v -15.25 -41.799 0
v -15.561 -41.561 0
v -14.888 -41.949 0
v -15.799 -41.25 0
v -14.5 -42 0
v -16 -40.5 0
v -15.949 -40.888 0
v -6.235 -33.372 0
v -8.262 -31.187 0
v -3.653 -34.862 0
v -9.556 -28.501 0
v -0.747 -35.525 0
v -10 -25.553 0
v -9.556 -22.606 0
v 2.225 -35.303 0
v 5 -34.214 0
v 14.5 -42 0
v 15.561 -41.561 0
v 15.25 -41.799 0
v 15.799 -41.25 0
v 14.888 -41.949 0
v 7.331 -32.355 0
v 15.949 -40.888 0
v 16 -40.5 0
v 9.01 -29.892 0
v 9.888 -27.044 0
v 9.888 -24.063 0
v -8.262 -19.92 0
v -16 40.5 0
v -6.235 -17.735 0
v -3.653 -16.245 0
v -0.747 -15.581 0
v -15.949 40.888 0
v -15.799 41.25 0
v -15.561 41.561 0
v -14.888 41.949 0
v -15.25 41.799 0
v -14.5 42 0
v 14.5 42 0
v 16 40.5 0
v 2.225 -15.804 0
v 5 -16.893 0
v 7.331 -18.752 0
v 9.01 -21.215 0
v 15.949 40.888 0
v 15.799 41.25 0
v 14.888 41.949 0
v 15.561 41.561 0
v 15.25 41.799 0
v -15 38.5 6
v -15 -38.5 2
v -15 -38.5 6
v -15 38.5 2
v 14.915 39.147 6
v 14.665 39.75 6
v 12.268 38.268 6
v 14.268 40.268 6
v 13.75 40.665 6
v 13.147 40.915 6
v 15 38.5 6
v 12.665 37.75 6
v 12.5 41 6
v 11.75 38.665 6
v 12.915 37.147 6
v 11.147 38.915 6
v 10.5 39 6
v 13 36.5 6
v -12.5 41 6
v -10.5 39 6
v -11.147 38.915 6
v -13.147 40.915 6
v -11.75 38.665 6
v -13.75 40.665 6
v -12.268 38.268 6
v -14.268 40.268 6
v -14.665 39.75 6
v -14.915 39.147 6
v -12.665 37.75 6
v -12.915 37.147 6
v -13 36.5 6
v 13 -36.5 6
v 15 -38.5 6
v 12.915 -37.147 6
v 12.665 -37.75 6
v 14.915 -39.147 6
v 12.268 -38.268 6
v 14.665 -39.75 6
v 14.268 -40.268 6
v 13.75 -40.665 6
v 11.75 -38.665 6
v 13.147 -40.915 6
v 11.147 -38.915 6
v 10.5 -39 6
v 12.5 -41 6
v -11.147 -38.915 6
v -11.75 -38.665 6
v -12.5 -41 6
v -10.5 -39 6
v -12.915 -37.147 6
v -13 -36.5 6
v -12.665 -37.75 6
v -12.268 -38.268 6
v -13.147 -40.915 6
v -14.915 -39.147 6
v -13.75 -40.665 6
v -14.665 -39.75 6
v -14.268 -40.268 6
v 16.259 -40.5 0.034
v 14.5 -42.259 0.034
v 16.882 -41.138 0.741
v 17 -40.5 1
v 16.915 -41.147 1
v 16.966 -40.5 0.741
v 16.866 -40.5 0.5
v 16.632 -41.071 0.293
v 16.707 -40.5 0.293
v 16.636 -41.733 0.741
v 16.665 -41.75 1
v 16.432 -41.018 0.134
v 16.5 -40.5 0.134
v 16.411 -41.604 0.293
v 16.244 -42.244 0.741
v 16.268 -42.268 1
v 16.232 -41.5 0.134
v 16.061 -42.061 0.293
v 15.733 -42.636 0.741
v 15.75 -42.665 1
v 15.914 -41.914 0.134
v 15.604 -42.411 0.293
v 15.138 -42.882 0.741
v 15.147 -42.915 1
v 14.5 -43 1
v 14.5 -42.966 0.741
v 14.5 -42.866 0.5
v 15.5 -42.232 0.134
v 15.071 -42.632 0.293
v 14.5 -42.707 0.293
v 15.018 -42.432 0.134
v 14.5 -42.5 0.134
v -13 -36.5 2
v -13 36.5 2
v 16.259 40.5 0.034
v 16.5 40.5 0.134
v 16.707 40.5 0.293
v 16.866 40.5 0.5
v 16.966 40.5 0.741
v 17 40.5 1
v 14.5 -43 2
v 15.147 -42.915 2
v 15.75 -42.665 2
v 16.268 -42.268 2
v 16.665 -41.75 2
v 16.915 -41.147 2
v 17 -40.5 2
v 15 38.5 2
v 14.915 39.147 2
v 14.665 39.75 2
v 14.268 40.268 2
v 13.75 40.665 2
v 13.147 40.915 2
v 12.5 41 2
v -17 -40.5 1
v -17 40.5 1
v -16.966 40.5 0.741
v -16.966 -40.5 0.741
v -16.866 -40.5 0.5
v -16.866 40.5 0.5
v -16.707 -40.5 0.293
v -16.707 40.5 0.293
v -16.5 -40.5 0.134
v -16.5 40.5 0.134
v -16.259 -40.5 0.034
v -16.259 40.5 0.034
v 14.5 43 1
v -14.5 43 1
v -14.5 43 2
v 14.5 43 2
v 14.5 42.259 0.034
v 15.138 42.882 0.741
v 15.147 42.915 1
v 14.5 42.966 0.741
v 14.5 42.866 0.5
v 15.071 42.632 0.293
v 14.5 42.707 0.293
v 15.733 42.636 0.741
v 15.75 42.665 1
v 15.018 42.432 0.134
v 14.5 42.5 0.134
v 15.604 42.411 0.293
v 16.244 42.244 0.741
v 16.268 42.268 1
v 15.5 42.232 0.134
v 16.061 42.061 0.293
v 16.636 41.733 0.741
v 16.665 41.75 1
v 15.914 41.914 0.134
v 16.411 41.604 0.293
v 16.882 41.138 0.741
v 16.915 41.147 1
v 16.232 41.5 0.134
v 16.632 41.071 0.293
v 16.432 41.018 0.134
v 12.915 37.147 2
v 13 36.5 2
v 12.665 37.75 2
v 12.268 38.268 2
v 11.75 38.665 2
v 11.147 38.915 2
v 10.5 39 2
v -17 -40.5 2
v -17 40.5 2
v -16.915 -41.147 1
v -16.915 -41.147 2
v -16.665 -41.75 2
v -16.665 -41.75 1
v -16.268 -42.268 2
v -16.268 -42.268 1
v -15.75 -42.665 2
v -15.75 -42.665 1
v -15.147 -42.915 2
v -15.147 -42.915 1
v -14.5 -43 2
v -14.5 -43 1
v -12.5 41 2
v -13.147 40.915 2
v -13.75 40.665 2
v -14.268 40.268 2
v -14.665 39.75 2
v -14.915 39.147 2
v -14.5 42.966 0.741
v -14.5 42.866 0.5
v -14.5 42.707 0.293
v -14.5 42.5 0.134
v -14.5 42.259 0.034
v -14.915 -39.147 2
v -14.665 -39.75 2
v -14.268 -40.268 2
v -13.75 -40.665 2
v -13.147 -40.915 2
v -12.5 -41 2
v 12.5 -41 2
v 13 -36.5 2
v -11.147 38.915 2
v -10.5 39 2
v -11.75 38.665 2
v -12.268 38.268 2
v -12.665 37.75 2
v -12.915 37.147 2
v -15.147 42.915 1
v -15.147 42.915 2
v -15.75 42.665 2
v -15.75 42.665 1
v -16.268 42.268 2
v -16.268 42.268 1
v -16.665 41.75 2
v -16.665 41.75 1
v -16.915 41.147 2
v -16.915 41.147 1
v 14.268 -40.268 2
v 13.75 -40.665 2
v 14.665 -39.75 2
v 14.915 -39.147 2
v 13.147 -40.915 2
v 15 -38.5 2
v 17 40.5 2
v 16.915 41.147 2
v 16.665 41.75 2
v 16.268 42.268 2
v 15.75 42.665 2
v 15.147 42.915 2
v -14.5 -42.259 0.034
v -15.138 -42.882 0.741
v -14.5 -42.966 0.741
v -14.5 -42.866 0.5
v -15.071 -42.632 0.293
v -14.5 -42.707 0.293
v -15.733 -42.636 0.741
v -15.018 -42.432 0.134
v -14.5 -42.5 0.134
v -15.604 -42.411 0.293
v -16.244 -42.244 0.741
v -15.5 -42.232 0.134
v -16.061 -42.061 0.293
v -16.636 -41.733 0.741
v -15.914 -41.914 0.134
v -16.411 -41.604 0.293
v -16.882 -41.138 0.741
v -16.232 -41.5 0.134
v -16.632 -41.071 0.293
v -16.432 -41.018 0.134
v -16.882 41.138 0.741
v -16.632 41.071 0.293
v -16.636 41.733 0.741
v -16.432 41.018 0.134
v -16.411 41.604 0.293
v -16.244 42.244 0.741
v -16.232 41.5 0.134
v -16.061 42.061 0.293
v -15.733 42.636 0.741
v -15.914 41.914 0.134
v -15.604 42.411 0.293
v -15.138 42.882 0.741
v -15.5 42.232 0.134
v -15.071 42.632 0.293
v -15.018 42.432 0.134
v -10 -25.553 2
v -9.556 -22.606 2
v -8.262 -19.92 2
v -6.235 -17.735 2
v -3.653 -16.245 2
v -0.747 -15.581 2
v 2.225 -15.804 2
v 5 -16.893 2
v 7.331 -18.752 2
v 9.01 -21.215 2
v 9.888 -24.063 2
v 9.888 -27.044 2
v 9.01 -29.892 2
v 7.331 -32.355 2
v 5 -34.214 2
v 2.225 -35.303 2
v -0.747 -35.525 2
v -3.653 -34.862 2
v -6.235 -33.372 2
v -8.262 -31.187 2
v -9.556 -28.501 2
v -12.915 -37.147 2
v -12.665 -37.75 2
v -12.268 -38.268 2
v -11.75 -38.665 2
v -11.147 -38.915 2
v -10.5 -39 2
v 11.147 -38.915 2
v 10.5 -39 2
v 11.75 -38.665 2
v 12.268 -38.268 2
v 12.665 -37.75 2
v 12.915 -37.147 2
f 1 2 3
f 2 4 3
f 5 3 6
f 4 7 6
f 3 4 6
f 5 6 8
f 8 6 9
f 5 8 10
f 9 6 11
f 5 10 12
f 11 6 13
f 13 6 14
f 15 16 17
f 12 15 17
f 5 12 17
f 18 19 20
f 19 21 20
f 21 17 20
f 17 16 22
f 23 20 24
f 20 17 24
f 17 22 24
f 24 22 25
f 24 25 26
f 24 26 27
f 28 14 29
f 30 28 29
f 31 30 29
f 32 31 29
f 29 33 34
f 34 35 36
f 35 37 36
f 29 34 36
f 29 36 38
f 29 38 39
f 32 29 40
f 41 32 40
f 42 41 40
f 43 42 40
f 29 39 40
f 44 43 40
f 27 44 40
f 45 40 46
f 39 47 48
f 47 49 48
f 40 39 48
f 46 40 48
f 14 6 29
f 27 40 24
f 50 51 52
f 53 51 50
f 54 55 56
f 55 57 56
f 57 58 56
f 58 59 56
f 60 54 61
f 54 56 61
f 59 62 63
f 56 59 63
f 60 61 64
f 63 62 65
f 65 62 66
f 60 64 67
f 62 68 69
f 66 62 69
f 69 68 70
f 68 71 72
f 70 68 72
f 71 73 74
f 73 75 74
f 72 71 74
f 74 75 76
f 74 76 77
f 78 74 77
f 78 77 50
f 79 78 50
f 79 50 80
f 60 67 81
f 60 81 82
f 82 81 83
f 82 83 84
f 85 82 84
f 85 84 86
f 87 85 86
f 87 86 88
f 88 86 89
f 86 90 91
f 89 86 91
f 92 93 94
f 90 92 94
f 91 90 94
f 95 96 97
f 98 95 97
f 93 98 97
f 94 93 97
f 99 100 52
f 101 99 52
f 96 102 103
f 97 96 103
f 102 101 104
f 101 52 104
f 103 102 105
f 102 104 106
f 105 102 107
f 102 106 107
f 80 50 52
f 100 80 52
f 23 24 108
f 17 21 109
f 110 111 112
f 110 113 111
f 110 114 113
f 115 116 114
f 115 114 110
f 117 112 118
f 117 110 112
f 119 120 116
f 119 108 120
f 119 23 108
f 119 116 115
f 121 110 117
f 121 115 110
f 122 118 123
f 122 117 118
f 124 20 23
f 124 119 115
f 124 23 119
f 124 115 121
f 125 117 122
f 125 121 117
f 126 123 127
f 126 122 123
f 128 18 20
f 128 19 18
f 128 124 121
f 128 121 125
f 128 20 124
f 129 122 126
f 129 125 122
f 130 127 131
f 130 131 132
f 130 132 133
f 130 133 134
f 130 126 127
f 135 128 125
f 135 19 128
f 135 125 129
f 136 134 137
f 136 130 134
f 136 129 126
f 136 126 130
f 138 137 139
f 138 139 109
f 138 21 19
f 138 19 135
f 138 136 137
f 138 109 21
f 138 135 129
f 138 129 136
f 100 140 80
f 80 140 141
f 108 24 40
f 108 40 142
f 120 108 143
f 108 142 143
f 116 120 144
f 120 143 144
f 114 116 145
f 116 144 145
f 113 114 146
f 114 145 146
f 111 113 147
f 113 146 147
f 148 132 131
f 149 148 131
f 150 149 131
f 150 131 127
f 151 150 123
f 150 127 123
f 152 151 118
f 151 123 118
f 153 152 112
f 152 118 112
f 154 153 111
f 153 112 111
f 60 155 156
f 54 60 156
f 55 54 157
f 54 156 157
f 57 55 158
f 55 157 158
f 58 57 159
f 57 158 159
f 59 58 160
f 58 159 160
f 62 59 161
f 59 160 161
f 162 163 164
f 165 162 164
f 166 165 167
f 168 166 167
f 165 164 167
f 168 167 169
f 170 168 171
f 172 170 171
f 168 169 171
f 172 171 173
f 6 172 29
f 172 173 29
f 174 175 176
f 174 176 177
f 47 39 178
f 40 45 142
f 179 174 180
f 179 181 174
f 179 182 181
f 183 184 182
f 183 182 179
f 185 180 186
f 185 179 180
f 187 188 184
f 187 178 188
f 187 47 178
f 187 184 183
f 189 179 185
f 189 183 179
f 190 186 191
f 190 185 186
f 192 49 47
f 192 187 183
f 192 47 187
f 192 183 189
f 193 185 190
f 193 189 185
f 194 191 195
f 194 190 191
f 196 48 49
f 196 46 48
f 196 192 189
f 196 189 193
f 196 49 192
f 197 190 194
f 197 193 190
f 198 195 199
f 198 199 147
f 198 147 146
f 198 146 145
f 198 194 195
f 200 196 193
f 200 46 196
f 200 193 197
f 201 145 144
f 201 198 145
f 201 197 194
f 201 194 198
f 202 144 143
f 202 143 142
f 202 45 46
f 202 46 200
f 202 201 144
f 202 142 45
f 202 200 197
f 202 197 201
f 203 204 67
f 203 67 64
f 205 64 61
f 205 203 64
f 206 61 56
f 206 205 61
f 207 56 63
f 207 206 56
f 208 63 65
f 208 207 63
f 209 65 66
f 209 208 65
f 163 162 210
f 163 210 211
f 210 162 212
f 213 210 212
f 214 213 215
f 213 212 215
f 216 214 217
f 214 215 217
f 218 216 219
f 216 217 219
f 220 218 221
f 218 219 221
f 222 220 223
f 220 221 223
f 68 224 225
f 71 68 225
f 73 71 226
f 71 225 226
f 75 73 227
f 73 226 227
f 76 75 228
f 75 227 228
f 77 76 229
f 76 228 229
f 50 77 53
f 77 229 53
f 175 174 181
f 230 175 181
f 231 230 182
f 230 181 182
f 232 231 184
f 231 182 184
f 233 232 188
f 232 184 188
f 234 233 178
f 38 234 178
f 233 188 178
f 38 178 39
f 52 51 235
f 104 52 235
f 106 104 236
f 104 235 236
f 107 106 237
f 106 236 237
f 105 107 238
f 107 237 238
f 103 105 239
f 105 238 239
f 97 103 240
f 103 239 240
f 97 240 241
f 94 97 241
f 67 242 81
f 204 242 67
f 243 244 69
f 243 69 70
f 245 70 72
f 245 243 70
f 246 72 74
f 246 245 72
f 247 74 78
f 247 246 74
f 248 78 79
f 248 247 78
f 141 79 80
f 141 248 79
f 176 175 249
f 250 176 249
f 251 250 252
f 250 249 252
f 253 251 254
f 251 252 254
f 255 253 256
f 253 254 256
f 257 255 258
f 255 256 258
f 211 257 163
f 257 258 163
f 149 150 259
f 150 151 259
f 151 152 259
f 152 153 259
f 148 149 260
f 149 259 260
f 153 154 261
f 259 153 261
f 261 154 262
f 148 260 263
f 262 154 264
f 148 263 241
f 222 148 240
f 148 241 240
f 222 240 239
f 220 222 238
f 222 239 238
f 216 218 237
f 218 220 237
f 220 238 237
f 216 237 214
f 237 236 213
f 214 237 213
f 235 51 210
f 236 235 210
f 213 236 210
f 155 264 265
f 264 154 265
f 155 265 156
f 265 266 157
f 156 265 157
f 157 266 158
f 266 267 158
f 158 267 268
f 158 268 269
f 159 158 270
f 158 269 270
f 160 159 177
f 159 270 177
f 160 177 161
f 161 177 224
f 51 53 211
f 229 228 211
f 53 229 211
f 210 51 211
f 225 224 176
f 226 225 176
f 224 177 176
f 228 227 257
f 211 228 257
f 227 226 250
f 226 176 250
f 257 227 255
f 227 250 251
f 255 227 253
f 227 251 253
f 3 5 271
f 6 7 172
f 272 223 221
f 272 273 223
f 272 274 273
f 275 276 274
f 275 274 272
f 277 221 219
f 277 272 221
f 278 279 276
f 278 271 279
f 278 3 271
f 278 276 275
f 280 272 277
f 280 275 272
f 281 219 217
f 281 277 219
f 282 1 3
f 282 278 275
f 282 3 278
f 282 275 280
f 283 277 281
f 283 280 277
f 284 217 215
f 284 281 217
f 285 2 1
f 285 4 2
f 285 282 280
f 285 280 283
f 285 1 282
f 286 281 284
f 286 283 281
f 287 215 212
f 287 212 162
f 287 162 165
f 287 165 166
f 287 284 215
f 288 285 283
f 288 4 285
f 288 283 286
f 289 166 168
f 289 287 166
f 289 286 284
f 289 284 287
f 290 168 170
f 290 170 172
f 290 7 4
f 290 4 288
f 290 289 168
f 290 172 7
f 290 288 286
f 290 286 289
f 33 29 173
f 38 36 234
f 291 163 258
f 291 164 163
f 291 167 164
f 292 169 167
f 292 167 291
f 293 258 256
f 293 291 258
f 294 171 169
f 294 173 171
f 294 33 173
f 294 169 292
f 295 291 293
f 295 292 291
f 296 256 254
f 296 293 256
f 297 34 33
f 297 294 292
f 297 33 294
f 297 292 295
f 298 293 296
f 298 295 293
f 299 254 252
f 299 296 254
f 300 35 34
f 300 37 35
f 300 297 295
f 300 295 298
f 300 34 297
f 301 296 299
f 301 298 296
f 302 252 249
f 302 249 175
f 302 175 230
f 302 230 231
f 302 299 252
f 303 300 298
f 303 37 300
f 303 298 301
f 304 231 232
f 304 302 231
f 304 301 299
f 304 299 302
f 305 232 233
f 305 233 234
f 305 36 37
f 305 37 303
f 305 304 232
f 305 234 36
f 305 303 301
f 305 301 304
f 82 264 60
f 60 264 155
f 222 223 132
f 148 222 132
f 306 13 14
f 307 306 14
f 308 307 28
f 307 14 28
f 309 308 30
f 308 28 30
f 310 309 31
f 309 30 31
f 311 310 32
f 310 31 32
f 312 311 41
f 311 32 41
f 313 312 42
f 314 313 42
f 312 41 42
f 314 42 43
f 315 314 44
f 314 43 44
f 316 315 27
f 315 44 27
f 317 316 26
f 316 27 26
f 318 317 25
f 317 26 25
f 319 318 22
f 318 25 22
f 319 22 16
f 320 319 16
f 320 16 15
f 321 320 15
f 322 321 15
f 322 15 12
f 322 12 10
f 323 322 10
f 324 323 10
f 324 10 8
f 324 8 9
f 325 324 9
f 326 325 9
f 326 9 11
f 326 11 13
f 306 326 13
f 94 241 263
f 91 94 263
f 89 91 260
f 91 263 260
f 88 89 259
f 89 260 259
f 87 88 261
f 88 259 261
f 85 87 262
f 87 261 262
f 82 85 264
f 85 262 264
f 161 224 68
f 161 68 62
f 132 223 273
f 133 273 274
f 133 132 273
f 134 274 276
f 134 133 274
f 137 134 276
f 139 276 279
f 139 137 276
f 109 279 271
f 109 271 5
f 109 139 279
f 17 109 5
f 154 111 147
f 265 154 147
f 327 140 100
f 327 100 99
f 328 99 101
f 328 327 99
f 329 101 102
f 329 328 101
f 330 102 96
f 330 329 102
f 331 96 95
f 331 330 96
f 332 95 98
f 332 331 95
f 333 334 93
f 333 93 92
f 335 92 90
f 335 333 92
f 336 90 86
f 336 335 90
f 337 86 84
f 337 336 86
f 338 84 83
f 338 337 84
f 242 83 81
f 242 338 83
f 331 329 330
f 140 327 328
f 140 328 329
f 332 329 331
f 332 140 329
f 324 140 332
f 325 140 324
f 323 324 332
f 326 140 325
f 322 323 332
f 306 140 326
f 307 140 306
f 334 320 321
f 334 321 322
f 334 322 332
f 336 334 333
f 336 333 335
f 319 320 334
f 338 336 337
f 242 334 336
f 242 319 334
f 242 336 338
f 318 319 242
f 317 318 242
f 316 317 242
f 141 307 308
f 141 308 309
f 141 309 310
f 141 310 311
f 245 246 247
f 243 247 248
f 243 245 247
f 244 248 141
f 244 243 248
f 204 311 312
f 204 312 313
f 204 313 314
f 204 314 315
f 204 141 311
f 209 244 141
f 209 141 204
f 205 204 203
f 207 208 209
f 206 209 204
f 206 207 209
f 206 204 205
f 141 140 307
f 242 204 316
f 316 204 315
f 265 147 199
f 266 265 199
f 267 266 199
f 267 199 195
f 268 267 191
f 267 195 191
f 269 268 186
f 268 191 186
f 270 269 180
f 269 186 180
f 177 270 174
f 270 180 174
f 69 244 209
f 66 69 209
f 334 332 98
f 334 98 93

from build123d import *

# Parameters (mm, degrees)
ESQUISSE1_W             = 34
ESQUISSE1_H             = 86
BOSS_EXTRU_1_DEPTH      = 2
ESQUISSE2_W             = 30
ESQUISSE2_H             = 82
ESQUISSE2_W_2           = 26
ESQUISSE2_H_2           = 78
BOSS_EXTRU_2_DEPTH      = 4
CONG_3_R                = 1
CONG_2_R                = 2.5
ESQUISSE3_R             = 10
ENL_V_MAT_EXTRU_1_DEPTH = 4


with BuildPart() as part:
    # Esquisse1 → Boss.-Extru.1 (new body)
    with BuildSketch(Plane.XY):
        Rectangle(ESQUISSE1_W, ESQUISSE1_H)
    extrude(amount=BOSS_EXTRU_1_DEPTH)

    # Esquisse2 → Boss.-Extru.2 (add)
    with BuildSketch(Plane.XY.offset(2)):
        Rectangle(ESQUISSE2_W, ESQUISSE2_H)
        Rectangle(ESQUISSE2_W_2, ESQUISSE2_H_2, mode=Mode.SUBTRACT)
    extrude(amount=BOSS_EXTRU_2_DEPTH)

    # Congé3
    cong_3_edges = [part.edges().sort_by_distance(p)[0] for p in [
        (0, 43, 0),
        (17, 0, 0),
        (0, -43, 0),
        (-17, 0, 0),
    ]]
    fillet(cong_3_edges, radius=CONG_3_R)

    # Congé2
    # the kernel refuses this fillet: 2.5 mm, written as the material it adds along each edge
    with BuildSketch(Plane(origin=(-13, -39, 2), x_dir=(0, 1, 0), z_dir=(0, 0, 1)), Plane(origin=(13, 39, 2), x_dir=(0, -1, 0), z_dir=(0, 0, 1)), Plane(origin=(-13, 39, 2), x_dir=(1, 0, 0), z_dir=(0, 0, 1))) as cong_2_piece_1:
        with BuildLine():
            CenterArc((CONG_2_R, -CONG_2_R), CONG_2_R, 90, 90)
            Line((0, -CONG_2_R), (-CONG_2_R * 0.02, -CONG_2_R))
            Line((-CONG_2_R * 0.02, -CONG_2_R), (-CONG_2_R * 0.02, CONG_2_R * 0.02))
            Line((-CONG_2_R * 0.02, CONG_2_R * 0.02), (CONG_2_R, CONG_2_R * 0.02))
            Line((CONG_2_R, CONG_2_R * 0.02), (CONG_2_R, 0))
        make_face()
    extrude(amount=4)
    with BuildSketch(Plane(origin=(13, -39, 2), x_dir=(0, 1, 0), z_dir=(0, 0, 1))) as cong_2_piece_2:
        with BuildLine():
            CenterArc((CONG_2_R, CONG_2_R), CONG_2_R, 180, 90)
            Line((0, CONG_2_R), (-CONG_2_R * 0.02, CONG_2_R))
            Line((-CONG_2_R * 0.02, CONG_2_R), (-CONG_2_R * 0.02, -CONG_2_R * 0.02))
            Line((-CONG_2_R * 0.02, -CONG_2_R * 0.02), (CONG_2_R, -CONG_2_R * 0.02))
            Line((CONG_2_R, -CONG_2_R * 0.02), (CONG_2_R, 0))
        make_face()
    extrude(amount=4)
    # the kernel refuses this fillet: 2.5 mm, written as the material it takes off along each edge
    with BuildSketch(Plane(origin=(14.5, 40.5, 0), x_dir=(0, 1, 0), z_dir=(-1, 0, 0))) as cong_2_2_piece_1:
        with BuildLine():
            CenterArc((1.5, -1), 1, 0, 90)
            Line((2.5, -1), (2.5, 0))
            Line((2.5, 0), (1.5, 0))
        make_face()
    revolve(axis=Axis((14.5, 40.5, 0), (0, 0, -1)), revolution_arc=90, mode=Mode.SUBTRACT)
    with BuildSketch(Plane(origin=(14.5, -40.5, 0), x_dir=(1, 0, 0), z_dir=(0, 1, 0))) as cong_2_2_piece_2:
        with BuildLine():
            CenterArc((1.5, -1), 1, 0, 90)
            Line((2.5, -1), (2.5, 0))
            Line((2.5, 0), (1.5, 0))
        make_face()
    revolve(axis=Axis((14.5, -40.5, 0), (0, 0, -1)), revolution_arc=90, mode=Mode.SUBTRACT)
    with BuildSketch(Plane(origin=(-14.5, 40.5, 0), x_dir=(-1, 0, 0), z_dir=(0, -1, 0))) as cong_2_2_piece_3:
        with BuildLine():
            CenterArc((1.5, -1), 1, 0, 90)
            Line((2.5, -1), (2.5, 0))
            Line((2.5, 0), (1.5, 0))
        make_face()
    revolve(axis=Axis((-14.5, 40.5, 0), (0, 0, -1)), revolution_arc=90, mode=Mode.SUBTRACT)
    with BuildSketch(Plane(origin=(-14.5, -40.5, 0), x_dir=(0, -1, 0), z_dir=(1, 0, 0))) as cong_2_2_piece_4:
        with BuildLine():
            CenterArc((1.5, -1), 1, 0, 90)
            Line((2.5, -1), (2.5, 0))
            Line((2.5, 0), (1.5, 0))
        make_face()
    revolve(axis=Axis((-14.5, -40.5, 0), (0, 0, -1)), revolution_arc=90, mode=Mode.SUBTRACT)
    with BuildSketch(Plane(origin=(-15, 41, 2), x_dir=(0, -1, 0), z_dir=(0, 0, 1)), Plane(origin=(-15, -41, 2), x_dir=(1, 0, 0), z_dir=(0, 0, 1)), Plane(origin=(15, 41, 2), x_dir=(-1, 0, 0), z_dir=(0, 0, 1))) as cong_2_2_piece_5:
        with BuildLine():
            CenterArc((CONG_2_R, CONG_2_R), CONG_2_R, 180, 90)
            Line((0, CONG_2_R), (-CONG_2_R * 0.02, CONG_2_R))
            Line((-CONG_2_R * 0.02, CONG_2_R), (-CONG_2_R * 0.02, -CONG_2_R * 0.02))
            Line((-CONG_2_R * 0.02, -CONG_2_R * 0.02), (CONG_2_R, -CONG_2_R * 0.02))
            Line((CONG_2_R, -CONG_2_R * 0.02), (CONG_2_R, 0))
        make_face()
    extrude(amount=4, mode=Mode.SUBTRACT)
    with BuildSketch(Plane(origin=(15, -41, 2), x_dir=(-1, 0, 0), z_dir=(0, 0, 1))) as cong_2_2_piece_6:
        with BuildLine():
            CenterArc((CONG_2_R, -CONG_2_R), CONG_2_R, 90, 90)
            Line((0, -CONG_2_R), (-CONG_2_R * 0.02, -CONG_2_R))
            Line((-CONG_2_R * 0.02, -CONG_2_R), (-CONG_2_R * 0.02, CONG_2_R * 0.02))
            Line((-CONG_2_R * 0.02, CONG_2_R * 0.02), (CONG_2_R, CONG_2_R * 0.02))
            Line((CONG_2_R, CONG_2_R * 0.02), (CONG_2_R, 0))
        make_face()
    extrude(amount=4, mode=Mode.SUBTRACT)
    with BuildSketch(Plane(origin=(-17, 43, 0), x_dir=(0, -1, 0), z_dir=(0, 0, 1)), Plane(origin=(-17, -43, 0), x_dir=(1, 0, 0), z_dir=(0, 0, 1))) as cong_2_2_piece_7:
        with BuildLine():
            CenterArc((CONG_2_R, CONG_2_R), CONG_2_R, 180, 90)
            Line((0, CONG_2_R), (-CONG_2_R * 0.02, CONG_2_R))
            Line((-CONG_2_R * 0.02, CONG_2_R), (-CONG_2_R * 0.02, -CONG_2_R * 0.02))
            Line((-CONG_2_R * 0.02, -CONG_2_R * 0.02), (CONG_2_R, -CONG_2_R * 0.02))
            Line((CONG_2_R, -CONG_2_R * 0.02), (CONG_2_R, 0))
        make_face()
    extrude(amount=2, mode=Mode.SUBTRACT)
    with BuildSketch(Plane(origin=(17, 43, 0), x_dir=(0, -1, 0), z_dir=(0, 0, 1)), Plane(origin=(17, -43, 0), x_dir=(-1, 0, 0), z_dir=(0, 0, 1))) as cong_2_2_piece_8:
        with BuildLine():
            CenterArc((CONG_2_R, -CONG_2_R), CONG_2_R, 90, 90)
            Line((0, -CONG_2_R), (-CONG_2_R * 0.02, -CONG_2_R))
            Line((-CONG_2_R * 0.02, -CONG_2_R), (-CONG_2_R * 0.02, CONG_2_R * 0.02))
            Line((-CONG_2_R * 0.02, CONG_2_R * 0.02), (CONG_2_R, CONG_2_R * 0.02))
            Line((CONG_2_R, CONG_2_R * 0.02), (CONG_2_R, 0))
        make_face()
    extrude(amount=2, mode=Mode.SUBTRACT)

    # Esquisse3 → Enlèv. mat.-Extru.1 (cut)
    with BuildSketch(Plane(origin=(0, 0, 0), x_dir=(-1, 0, 0), z_dir=(0, 0, -1))):
        with Locations((0, -25.553422343)):
            Circle(ESQUISSE3_R)
    extrude(amount=-ENL_V_MAT_EXTRU_1_DEPTH, mode=Mode.SUBTRACT)


solid = part.part
